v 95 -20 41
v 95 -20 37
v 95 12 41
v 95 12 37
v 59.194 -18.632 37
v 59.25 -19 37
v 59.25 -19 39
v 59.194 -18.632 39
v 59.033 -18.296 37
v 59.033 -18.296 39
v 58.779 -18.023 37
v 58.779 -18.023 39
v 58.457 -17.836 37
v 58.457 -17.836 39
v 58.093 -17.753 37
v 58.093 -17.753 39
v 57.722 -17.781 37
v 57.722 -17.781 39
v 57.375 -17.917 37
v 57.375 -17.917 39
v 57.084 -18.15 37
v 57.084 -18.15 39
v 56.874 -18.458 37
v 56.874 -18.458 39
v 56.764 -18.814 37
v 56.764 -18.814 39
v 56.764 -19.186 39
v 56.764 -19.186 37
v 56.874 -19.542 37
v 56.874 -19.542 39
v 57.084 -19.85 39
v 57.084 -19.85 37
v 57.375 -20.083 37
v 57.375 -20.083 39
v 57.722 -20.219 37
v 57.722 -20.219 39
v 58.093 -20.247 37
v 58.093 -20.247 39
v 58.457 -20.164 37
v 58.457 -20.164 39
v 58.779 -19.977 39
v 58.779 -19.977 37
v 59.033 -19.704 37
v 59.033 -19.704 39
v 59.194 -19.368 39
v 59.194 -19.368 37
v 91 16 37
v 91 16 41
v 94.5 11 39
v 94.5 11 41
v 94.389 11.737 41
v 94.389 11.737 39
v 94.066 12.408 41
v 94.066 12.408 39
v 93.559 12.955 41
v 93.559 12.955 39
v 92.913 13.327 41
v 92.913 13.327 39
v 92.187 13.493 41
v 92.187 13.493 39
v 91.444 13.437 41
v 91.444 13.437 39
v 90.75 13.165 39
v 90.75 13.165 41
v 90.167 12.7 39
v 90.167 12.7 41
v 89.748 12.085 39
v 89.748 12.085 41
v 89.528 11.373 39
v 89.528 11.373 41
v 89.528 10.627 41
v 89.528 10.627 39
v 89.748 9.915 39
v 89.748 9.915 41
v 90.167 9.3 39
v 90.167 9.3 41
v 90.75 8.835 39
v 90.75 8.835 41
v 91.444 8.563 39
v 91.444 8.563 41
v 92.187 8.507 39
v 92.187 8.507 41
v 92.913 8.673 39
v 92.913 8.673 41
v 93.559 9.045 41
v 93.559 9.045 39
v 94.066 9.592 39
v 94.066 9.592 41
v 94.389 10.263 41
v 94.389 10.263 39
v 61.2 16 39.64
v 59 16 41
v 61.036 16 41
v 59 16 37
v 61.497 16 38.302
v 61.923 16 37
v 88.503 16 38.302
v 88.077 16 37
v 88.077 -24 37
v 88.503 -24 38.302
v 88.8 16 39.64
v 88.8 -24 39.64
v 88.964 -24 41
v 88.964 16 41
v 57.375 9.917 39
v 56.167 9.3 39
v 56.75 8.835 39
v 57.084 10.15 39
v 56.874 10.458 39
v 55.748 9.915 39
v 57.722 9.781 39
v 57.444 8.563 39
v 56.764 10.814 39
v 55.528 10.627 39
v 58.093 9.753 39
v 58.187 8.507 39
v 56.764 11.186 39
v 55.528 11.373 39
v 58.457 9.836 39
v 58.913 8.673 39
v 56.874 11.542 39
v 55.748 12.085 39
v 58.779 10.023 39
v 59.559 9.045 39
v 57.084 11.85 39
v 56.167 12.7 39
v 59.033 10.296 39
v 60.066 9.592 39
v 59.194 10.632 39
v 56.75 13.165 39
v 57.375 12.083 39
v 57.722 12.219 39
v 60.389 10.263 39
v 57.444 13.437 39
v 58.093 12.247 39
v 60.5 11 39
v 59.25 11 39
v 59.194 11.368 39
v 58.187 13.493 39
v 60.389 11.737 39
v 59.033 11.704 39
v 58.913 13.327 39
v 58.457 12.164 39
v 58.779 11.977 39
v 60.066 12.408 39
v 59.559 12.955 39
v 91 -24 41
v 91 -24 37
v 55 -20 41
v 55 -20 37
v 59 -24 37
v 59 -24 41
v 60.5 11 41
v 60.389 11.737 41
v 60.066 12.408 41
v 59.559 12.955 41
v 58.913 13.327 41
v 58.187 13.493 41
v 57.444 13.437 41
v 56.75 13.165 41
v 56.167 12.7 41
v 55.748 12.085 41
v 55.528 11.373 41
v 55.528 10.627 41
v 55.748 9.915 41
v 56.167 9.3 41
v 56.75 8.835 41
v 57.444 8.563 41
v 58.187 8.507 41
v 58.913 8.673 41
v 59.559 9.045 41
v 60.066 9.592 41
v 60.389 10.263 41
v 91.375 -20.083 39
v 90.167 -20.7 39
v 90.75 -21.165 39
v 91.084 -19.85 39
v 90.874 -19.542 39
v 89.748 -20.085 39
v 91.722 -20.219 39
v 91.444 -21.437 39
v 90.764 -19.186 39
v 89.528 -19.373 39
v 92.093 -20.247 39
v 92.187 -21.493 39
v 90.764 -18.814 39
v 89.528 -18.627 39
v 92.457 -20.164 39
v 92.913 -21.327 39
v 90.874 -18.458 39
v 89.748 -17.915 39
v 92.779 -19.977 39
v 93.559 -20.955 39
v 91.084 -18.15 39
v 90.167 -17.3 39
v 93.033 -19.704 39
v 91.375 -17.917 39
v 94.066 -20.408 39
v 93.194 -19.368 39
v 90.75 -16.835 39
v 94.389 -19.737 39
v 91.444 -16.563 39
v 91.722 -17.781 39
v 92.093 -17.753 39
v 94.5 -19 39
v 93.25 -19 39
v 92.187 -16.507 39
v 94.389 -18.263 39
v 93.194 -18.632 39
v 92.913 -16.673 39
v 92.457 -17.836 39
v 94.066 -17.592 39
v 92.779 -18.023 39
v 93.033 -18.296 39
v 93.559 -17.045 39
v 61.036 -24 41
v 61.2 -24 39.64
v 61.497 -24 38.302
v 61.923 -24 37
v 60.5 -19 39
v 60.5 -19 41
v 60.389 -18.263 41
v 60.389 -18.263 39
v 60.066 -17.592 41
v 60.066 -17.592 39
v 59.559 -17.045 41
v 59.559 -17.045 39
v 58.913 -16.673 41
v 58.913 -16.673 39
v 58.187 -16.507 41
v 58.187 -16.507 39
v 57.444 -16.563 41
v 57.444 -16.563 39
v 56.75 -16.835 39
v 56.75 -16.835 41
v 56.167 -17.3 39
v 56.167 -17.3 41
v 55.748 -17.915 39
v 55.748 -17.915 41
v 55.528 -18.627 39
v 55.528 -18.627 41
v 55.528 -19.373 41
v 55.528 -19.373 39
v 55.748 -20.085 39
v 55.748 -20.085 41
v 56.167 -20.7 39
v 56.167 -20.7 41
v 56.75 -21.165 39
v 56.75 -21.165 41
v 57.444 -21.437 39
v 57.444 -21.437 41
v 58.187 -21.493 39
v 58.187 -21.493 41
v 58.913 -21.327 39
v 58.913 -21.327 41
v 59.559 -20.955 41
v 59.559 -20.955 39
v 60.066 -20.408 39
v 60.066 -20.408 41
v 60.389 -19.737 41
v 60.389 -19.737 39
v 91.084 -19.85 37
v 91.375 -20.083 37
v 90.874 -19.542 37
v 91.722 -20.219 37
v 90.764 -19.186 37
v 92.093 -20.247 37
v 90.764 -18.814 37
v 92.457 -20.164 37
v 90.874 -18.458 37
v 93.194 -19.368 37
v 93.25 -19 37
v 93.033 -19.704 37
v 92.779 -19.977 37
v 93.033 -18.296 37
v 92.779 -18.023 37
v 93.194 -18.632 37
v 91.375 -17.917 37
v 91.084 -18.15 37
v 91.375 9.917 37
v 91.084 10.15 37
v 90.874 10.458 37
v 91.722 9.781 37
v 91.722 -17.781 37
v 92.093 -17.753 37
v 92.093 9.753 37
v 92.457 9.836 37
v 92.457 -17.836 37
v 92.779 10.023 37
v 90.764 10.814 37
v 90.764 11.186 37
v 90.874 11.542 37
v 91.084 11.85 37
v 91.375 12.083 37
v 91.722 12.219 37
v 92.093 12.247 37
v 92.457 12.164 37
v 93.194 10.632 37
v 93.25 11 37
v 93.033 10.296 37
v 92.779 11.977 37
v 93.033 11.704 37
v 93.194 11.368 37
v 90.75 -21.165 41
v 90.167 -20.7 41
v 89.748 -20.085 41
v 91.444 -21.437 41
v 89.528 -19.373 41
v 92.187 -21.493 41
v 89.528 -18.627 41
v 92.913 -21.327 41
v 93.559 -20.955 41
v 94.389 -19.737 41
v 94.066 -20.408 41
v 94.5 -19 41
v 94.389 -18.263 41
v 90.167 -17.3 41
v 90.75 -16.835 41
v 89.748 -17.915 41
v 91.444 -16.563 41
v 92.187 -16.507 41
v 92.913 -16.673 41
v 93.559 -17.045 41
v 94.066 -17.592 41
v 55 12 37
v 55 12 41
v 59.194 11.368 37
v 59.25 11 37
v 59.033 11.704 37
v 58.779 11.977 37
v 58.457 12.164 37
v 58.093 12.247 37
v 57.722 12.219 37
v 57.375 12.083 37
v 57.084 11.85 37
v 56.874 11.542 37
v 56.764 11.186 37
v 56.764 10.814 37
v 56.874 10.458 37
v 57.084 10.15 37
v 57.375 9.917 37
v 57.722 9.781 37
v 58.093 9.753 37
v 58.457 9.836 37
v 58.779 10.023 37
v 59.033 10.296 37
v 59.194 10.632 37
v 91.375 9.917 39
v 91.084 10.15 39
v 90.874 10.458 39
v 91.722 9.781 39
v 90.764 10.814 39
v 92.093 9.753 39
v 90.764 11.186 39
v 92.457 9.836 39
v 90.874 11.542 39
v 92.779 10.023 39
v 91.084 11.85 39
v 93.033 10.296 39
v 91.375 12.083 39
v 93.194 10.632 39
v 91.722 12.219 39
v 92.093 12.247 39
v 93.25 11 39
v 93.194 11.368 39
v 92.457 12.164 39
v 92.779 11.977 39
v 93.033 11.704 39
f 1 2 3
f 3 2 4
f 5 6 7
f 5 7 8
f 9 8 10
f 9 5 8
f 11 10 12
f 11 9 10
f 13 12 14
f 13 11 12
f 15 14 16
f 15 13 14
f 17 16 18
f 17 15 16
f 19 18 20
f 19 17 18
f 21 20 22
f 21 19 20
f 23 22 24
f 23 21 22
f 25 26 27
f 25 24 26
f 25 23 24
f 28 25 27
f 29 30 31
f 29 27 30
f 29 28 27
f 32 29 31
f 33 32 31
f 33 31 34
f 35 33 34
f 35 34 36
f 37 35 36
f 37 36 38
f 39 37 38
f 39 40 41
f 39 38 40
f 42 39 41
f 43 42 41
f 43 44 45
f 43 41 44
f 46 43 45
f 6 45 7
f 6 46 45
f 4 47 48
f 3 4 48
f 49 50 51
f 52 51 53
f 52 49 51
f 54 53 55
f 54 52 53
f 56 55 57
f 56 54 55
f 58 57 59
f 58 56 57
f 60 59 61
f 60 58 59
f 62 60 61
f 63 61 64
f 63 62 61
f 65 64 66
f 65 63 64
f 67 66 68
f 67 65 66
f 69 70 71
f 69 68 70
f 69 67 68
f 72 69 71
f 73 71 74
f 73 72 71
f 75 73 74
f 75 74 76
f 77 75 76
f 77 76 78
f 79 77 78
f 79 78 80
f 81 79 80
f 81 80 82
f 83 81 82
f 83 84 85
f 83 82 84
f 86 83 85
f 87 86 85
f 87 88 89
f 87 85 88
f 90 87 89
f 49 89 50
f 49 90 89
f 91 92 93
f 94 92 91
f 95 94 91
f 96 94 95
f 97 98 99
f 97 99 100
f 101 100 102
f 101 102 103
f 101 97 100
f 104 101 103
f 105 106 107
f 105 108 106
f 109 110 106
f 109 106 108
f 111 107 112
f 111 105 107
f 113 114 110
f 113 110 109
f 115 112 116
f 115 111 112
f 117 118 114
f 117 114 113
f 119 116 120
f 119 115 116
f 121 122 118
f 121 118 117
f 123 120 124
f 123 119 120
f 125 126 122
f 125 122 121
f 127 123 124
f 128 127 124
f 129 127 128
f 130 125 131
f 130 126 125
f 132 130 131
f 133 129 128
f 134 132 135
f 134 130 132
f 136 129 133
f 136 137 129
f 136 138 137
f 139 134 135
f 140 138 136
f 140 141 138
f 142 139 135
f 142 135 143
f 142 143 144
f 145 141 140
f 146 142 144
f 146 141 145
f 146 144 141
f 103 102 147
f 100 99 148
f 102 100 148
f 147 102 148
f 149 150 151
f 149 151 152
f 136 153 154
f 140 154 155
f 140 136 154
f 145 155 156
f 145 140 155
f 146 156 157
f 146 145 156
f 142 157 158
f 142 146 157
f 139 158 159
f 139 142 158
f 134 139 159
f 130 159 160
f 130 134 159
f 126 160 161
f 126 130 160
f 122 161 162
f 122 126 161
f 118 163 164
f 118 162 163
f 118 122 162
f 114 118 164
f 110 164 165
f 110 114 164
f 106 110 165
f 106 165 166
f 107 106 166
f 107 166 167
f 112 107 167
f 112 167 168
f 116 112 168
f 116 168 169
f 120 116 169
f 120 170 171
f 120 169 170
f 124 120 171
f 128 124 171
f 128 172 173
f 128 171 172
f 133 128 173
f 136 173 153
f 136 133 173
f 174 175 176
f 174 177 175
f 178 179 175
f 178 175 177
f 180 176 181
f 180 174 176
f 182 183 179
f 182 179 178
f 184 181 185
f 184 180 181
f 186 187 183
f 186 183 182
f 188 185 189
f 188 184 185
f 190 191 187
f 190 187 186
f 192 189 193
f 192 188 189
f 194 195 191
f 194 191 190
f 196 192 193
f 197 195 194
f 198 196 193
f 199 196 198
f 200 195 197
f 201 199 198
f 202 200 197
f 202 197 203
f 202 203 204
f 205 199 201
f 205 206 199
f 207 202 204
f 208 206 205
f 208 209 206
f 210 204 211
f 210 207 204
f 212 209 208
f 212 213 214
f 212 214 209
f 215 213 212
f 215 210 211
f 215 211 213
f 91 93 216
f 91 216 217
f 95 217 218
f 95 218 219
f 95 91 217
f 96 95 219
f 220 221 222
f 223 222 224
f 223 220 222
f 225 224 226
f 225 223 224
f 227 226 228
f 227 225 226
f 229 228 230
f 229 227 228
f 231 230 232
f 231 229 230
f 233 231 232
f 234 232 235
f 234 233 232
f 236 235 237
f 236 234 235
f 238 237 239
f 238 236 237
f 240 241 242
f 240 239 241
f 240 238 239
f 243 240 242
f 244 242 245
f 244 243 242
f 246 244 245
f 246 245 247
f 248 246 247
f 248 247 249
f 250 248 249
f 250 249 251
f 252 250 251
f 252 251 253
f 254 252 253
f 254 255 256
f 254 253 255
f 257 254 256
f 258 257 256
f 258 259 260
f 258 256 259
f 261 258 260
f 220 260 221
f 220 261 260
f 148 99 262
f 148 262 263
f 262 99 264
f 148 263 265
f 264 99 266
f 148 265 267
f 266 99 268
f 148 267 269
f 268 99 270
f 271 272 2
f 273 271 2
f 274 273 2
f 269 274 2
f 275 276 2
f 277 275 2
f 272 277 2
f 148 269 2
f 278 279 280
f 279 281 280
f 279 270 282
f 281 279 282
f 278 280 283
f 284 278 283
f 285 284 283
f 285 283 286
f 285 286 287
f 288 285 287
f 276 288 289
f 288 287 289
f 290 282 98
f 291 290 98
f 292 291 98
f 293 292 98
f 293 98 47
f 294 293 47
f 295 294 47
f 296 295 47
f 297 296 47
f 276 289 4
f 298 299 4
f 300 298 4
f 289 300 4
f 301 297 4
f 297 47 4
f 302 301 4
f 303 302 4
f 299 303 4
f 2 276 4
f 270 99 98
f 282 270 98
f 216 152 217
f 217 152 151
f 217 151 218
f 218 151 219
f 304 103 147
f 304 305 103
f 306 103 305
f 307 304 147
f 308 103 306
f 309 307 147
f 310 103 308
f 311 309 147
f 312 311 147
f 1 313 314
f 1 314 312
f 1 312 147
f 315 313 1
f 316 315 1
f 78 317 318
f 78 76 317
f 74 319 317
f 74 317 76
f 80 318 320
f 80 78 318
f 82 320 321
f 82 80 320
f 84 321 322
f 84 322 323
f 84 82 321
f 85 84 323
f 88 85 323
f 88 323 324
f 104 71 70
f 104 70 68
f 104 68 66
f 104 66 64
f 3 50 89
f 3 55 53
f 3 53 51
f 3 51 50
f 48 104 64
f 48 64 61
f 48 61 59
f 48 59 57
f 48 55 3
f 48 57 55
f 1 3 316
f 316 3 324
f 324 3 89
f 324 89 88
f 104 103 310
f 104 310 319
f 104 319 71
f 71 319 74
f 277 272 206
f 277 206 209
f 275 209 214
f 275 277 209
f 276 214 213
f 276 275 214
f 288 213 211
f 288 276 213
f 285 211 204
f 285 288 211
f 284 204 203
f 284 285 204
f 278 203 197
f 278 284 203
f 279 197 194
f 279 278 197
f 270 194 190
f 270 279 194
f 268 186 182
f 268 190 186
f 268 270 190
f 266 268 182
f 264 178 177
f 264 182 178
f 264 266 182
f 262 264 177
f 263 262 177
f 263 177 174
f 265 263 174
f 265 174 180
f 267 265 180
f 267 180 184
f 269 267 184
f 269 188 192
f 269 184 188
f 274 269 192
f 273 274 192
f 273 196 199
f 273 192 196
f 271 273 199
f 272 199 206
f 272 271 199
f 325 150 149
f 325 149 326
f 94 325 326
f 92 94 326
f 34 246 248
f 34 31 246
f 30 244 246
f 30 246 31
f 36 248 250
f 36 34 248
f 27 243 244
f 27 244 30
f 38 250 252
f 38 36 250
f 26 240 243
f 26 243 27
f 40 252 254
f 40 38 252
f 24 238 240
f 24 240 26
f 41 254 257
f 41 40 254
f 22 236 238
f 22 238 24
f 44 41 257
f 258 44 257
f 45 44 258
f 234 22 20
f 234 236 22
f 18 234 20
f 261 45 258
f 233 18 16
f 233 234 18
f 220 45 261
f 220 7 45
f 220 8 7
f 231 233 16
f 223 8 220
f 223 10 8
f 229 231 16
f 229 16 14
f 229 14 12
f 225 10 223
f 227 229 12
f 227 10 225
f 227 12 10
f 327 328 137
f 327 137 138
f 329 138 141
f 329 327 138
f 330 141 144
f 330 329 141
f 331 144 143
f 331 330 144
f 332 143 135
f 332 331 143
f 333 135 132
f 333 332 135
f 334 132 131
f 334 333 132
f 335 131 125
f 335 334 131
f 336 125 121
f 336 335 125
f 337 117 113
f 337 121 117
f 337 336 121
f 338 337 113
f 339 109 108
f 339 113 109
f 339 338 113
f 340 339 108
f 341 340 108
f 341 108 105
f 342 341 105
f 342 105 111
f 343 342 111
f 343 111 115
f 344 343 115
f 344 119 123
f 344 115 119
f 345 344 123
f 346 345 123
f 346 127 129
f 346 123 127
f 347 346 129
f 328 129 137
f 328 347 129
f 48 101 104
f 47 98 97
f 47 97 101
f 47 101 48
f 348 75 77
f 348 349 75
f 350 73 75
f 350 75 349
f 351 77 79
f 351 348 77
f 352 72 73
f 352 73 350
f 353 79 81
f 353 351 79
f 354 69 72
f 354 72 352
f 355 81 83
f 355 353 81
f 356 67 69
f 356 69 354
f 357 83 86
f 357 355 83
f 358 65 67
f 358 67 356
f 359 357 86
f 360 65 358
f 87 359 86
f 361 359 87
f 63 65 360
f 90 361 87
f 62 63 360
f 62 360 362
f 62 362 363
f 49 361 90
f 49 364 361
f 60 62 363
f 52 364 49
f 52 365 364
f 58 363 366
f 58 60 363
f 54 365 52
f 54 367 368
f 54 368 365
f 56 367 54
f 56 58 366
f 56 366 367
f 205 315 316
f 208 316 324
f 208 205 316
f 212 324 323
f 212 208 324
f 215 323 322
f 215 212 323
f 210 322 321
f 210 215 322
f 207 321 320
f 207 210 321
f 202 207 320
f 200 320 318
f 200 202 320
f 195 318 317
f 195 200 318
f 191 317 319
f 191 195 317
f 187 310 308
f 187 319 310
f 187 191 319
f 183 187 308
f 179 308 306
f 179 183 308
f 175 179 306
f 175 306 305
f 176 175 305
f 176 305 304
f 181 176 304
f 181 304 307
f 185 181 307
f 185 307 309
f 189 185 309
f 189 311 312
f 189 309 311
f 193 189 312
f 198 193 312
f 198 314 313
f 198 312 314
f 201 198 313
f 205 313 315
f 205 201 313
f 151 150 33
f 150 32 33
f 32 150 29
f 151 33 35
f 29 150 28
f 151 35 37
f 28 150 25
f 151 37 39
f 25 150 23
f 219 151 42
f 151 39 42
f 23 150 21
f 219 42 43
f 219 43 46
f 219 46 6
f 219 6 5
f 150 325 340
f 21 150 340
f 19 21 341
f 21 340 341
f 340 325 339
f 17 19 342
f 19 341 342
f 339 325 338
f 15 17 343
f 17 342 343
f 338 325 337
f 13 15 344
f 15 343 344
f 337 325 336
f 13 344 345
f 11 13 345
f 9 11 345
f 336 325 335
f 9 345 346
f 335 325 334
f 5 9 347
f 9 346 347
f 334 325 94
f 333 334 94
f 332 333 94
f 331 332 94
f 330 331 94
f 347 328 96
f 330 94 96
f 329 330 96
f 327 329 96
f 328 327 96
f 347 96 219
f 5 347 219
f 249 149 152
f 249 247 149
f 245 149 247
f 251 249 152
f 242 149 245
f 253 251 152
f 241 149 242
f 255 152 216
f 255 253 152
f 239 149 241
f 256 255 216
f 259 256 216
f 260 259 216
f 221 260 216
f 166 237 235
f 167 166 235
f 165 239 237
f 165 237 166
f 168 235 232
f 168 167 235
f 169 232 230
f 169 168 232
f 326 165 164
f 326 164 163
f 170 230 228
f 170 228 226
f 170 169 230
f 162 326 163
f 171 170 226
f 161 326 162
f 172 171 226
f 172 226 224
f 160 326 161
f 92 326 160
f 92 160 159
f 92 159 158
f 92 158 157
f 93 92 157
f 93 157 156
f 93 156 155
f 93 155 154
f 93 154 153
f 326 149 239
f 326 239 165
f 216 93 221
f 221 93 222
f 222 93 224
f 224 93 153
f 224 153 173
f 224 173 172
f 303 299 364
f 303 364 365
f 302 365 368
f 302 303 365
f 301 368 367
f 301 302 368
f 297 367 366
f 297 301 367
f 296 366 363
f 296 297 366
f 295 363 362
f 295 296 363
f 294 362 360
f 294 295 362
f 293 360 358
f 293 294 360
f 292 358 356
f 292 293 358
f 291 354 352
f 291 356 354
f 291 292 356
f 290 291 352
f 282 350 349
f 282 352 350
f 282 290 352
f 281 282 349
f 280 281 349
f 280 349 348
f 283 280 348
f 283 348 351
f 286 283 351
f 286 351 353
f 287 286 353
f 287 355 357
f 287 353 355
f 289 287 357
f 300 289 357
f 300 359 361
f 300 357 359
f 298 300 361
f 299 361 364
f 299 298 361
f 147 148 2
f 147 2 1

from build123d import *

# Parameters (mm, degrees)
CYLINDER495_R      = 2.5
CYLINDER495_DEPTH  = 3
CYLINDER496_R      = 2.5
CYLINDER496_DEPTH  = 3
CYLINDER494_R      = 2.5
CYLINDER494_DEPTH  = 3
CYLINDER493_R      = 2.5
CYLINDER493_DEPTH  = 3
CYLINDER492_R      = 1.25
CYLINDER492_DEPTH  = 20
CYLINDER491_R      = 1.25
CYLINDER491_DEPTH  = 20
CYLINDER490_R      = 1.25
CYLINDER490_DEPTH  = 20
CYLINDER489_R      = 1.25
CYLINDER489_DEPTH  = 20
CYLINDER1801_R     = 14
CYLINDER1801_DEPTH = 40
BOX214_W           = 40
BOX214_H           = 40
BOX214_DEPTH       = 4
CHAMFER056_SIZE    = 4


with BuildPart() as v_lec495:
    # Cylinder495 → Cylinder495 (new body)
    with BuildSketch(Plane(origin=(58, -19, 26), x_dir=(1, 0, 0), z_dir=(0, 0, 1))):
        Circle(CYLINDER495_R)
    extrude(amount=CYLINDER495_DEPTH)


with BuildPart() as compound601:
    # Cylinder496 → Cylinder496 (new body)
    with BuildSketch(Plane(origin=(58, 11, 26), x_dir=(1, 0, 0), z_dir=(0, 0, 1))):
        Circle(CYLINDER496_R)
    extrude(amount=CYLINDER496_DEPTH)

    # Compound601: union Válec495
    add(v_lec495.part)


with BuildPart() as compound601_1:
    # Compound601 placement: moved
    add(compound601.part.moved(Location((34, 0, 13))))


with BuildPart() as v_lec494:
    # Cylinder494 → Cylinder494 (new body)
    with BuildSketch(Plane(origin=(58, -19, 26), x_dir=(1, 0, 0), z_dir=(0, 0, 1))):
        Circle(CYLINDER494_R)
    extrude(amount=CYLINDER494_DEPTH)


with BuildPart() as compound603:
    # Cylinder493 → Cylinder493 (new body)
    with BuildSketch(Plane(origin=(58, 11, 26), x_dir=(1, 0, 0), z_dir=(0, 0, 1))):
        Circle(CYLINDER493_R)
    extrude(amount=CYLINDER493_DEPTH)

    # Compound600: union Válec494
    add(v_lec494.part)


with BuildPart() as compound603_1:
    # Compound600 placement: moved
    add(compound603.part.moved(Location((0, 0, 13))))

    # Compound603: union Compound601
    add(compound601_1.part)


with BuildPart() as v_lec492:
    # Cylinder492 → Cylinder492 (new body)
    with BuildSketch(Plane(origin=(58, -19, 26), x_dir=(1, 0, 0), z_dir=(0, 0, 1))):
        Circle(CYLINDER492_R)
    extrude(amount=CYLINDER492_DEPTH)


with BuildPart() as compound599:
    # Cylinder491 → Cylinder491 (new body)
    with BuildSketch(Plane(origin=(58, 11, 26), x_dir=(1, 0, 0), z_dir=(0, 0, 1))):
        Circle(CYLINDER491_R)
    extrude(amount=CYLINDER491_DEPTH)

    # Compound599: union Válec492
    add(v_lec492.part)


with BuildPart() as compound599_1:
    # Compound599 placement: moved
    add(compound599.part.moved(Location((34, 0, 0))))


with BuildPart() as v_lec490:
    # Cylinder490 → Cylinder490 (new body)
    with BuildSketch(Plane(origin=(58, -19, 26), x_dir=(1, 0, 0), z_dir=(0, 0, 1))):
        Circle(CYLINDER490_R)
    extrude(amount=CYLINDER490_DEPTH)


with BuildPart() as compound602:
    # Cylinder489 → Cylinder489 (new body)
    with BuildSketch(Plane(origin=(58, 11, 26), x_dir=(1, 0, 0), z_dir=(0, 0, 1))):
        Circle(CYLINDER489_R)
    extrude(amount=CYLINDER489_DEPTH)

    # Compound897: union Válec490
    add(v_lec490.part)

    # Compound602: union Compound599
    add(compound599_1.part)


with BuildPart() as v_lec1801:
    # Cylinder1801 → Cylinder1801 (new body)
    with BuildSketch(Plane(origin=(75, 16, 42), x_dir=(1, 0, 0), z_dir=(0, -1, 0))):
        Circle(CYLINDER1801_R)
    extrude(amount=CYLINDER1801_DEPTH)


with BuildPart() as chamfer056:
    # Box214 → Box214 (new body)
    with BuildSketch(Plane(origin=(55, -24, 37), x_dir=(1, 0, 0), z_dir=(0, 0, 1))):
        with Locations((20, 20)):
            Rectangle(BOX214_W, BOX214_H)
    extrude(amount=BOX214_DEPTH)

    # Cut531: cut Válec1801
    add(v_lec1801.part, mode=Mode.SUBTRACT)

    # Cut376: cut Compound602
    add(compound602.part, mode=Mode.SUBTRACT)

    # Cut377: cut Compound603
    add(compound603_1.part, mode=Mode.SUBTRACT)

    # Chamfer056
    chamfer056_edges = [chamfer056.edges().sort_by_distance(p)[0] for p in [
        (55, -24, 39),
        (55, 16, 39),
        (95, -24, 39),
        (95, 16, 39),
    ]]
    chamfer(chamfer056_edges, length=CHAMFER056_SIZE)


solid = chamfer056.part
